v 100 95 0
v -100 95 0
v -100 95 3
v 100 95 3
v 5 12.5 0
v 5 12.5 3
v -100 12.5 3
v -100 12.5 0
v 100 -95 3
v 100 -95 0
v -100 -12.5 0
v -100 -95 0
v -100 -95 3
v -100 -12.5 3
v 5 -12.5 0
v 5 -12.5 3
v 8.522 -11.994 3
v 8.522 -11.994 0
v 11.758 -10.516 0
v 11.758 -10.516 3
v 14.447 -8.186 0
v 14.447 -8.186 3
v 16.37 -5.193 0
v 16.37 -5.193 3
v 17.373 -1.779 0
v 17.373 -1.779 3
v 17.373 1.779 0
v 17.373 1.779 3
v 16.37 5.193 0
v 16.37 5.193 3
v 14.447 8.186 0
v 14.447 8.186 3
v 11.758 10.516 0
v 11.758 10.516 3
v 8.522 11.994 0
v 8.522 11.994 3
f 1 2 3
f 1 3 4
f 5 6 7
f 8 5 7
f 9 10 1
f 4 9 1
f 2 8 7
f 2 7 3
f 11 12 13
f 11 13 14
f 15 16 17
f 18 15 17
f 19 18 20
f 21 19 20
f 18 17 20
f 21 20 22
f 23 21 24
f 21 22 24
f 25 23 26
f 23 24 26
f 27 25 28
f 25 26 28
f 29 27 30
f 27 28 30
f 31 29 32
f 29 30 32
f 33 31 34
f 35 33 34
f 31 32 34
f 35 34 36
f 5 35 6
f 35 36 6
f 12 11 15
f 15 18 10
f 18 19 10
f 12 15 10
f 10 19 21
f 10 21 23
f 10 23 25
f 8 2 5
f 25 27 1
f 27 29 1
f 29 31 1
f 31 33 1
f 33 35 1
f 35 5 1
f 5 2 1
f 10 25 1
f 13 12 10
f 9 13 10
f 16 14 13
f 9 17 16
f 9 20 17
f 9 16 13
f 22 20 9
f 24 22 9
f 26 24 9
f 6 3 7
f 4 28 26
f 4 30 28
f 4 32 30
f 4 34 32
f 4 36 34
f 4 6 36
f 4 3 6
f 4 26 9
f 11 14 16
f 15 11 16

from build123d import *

# Parameters (mm, degrees)
CROQUIS1_W              = 200
CROQUIS1_H              = 190
SALIENTE_EXTRUIR1_DEPTH = 3
CORTAR_EXTRUIR1_DEPTH   = 3


with BuildPart() as part:
    # Croquis1 → Saliente-Extruir1 (new body)
    with BuildSketch(Plane.XY):
        Rectangle(CROQUIS1_W, CROQUIS1_H)
    extrude(amount=SALIENTE_EXTRUIR1_DEPTH)

    # Croquis2 → Cortar-Extruir1 (cut)
    with BuildSketch(Plane.XY.offset(3)):
        with BuildLine():
            Line((5, 12.5), (-100, 12.5))
            Line((-100, 12.5), (-100, 0))
            Line((-100, 0), (-100, -12.5))
            Line((-100, -12.5), (5, -12.5))
            ThreePointArc((5, -12.5), (17.5, 0), (5, 12.5))
        make_face()
    extrude(amount=-CORTAR_EXTRUIR1_DEPTH, mode=Mode.SUBTRACT)


solid = part.part
